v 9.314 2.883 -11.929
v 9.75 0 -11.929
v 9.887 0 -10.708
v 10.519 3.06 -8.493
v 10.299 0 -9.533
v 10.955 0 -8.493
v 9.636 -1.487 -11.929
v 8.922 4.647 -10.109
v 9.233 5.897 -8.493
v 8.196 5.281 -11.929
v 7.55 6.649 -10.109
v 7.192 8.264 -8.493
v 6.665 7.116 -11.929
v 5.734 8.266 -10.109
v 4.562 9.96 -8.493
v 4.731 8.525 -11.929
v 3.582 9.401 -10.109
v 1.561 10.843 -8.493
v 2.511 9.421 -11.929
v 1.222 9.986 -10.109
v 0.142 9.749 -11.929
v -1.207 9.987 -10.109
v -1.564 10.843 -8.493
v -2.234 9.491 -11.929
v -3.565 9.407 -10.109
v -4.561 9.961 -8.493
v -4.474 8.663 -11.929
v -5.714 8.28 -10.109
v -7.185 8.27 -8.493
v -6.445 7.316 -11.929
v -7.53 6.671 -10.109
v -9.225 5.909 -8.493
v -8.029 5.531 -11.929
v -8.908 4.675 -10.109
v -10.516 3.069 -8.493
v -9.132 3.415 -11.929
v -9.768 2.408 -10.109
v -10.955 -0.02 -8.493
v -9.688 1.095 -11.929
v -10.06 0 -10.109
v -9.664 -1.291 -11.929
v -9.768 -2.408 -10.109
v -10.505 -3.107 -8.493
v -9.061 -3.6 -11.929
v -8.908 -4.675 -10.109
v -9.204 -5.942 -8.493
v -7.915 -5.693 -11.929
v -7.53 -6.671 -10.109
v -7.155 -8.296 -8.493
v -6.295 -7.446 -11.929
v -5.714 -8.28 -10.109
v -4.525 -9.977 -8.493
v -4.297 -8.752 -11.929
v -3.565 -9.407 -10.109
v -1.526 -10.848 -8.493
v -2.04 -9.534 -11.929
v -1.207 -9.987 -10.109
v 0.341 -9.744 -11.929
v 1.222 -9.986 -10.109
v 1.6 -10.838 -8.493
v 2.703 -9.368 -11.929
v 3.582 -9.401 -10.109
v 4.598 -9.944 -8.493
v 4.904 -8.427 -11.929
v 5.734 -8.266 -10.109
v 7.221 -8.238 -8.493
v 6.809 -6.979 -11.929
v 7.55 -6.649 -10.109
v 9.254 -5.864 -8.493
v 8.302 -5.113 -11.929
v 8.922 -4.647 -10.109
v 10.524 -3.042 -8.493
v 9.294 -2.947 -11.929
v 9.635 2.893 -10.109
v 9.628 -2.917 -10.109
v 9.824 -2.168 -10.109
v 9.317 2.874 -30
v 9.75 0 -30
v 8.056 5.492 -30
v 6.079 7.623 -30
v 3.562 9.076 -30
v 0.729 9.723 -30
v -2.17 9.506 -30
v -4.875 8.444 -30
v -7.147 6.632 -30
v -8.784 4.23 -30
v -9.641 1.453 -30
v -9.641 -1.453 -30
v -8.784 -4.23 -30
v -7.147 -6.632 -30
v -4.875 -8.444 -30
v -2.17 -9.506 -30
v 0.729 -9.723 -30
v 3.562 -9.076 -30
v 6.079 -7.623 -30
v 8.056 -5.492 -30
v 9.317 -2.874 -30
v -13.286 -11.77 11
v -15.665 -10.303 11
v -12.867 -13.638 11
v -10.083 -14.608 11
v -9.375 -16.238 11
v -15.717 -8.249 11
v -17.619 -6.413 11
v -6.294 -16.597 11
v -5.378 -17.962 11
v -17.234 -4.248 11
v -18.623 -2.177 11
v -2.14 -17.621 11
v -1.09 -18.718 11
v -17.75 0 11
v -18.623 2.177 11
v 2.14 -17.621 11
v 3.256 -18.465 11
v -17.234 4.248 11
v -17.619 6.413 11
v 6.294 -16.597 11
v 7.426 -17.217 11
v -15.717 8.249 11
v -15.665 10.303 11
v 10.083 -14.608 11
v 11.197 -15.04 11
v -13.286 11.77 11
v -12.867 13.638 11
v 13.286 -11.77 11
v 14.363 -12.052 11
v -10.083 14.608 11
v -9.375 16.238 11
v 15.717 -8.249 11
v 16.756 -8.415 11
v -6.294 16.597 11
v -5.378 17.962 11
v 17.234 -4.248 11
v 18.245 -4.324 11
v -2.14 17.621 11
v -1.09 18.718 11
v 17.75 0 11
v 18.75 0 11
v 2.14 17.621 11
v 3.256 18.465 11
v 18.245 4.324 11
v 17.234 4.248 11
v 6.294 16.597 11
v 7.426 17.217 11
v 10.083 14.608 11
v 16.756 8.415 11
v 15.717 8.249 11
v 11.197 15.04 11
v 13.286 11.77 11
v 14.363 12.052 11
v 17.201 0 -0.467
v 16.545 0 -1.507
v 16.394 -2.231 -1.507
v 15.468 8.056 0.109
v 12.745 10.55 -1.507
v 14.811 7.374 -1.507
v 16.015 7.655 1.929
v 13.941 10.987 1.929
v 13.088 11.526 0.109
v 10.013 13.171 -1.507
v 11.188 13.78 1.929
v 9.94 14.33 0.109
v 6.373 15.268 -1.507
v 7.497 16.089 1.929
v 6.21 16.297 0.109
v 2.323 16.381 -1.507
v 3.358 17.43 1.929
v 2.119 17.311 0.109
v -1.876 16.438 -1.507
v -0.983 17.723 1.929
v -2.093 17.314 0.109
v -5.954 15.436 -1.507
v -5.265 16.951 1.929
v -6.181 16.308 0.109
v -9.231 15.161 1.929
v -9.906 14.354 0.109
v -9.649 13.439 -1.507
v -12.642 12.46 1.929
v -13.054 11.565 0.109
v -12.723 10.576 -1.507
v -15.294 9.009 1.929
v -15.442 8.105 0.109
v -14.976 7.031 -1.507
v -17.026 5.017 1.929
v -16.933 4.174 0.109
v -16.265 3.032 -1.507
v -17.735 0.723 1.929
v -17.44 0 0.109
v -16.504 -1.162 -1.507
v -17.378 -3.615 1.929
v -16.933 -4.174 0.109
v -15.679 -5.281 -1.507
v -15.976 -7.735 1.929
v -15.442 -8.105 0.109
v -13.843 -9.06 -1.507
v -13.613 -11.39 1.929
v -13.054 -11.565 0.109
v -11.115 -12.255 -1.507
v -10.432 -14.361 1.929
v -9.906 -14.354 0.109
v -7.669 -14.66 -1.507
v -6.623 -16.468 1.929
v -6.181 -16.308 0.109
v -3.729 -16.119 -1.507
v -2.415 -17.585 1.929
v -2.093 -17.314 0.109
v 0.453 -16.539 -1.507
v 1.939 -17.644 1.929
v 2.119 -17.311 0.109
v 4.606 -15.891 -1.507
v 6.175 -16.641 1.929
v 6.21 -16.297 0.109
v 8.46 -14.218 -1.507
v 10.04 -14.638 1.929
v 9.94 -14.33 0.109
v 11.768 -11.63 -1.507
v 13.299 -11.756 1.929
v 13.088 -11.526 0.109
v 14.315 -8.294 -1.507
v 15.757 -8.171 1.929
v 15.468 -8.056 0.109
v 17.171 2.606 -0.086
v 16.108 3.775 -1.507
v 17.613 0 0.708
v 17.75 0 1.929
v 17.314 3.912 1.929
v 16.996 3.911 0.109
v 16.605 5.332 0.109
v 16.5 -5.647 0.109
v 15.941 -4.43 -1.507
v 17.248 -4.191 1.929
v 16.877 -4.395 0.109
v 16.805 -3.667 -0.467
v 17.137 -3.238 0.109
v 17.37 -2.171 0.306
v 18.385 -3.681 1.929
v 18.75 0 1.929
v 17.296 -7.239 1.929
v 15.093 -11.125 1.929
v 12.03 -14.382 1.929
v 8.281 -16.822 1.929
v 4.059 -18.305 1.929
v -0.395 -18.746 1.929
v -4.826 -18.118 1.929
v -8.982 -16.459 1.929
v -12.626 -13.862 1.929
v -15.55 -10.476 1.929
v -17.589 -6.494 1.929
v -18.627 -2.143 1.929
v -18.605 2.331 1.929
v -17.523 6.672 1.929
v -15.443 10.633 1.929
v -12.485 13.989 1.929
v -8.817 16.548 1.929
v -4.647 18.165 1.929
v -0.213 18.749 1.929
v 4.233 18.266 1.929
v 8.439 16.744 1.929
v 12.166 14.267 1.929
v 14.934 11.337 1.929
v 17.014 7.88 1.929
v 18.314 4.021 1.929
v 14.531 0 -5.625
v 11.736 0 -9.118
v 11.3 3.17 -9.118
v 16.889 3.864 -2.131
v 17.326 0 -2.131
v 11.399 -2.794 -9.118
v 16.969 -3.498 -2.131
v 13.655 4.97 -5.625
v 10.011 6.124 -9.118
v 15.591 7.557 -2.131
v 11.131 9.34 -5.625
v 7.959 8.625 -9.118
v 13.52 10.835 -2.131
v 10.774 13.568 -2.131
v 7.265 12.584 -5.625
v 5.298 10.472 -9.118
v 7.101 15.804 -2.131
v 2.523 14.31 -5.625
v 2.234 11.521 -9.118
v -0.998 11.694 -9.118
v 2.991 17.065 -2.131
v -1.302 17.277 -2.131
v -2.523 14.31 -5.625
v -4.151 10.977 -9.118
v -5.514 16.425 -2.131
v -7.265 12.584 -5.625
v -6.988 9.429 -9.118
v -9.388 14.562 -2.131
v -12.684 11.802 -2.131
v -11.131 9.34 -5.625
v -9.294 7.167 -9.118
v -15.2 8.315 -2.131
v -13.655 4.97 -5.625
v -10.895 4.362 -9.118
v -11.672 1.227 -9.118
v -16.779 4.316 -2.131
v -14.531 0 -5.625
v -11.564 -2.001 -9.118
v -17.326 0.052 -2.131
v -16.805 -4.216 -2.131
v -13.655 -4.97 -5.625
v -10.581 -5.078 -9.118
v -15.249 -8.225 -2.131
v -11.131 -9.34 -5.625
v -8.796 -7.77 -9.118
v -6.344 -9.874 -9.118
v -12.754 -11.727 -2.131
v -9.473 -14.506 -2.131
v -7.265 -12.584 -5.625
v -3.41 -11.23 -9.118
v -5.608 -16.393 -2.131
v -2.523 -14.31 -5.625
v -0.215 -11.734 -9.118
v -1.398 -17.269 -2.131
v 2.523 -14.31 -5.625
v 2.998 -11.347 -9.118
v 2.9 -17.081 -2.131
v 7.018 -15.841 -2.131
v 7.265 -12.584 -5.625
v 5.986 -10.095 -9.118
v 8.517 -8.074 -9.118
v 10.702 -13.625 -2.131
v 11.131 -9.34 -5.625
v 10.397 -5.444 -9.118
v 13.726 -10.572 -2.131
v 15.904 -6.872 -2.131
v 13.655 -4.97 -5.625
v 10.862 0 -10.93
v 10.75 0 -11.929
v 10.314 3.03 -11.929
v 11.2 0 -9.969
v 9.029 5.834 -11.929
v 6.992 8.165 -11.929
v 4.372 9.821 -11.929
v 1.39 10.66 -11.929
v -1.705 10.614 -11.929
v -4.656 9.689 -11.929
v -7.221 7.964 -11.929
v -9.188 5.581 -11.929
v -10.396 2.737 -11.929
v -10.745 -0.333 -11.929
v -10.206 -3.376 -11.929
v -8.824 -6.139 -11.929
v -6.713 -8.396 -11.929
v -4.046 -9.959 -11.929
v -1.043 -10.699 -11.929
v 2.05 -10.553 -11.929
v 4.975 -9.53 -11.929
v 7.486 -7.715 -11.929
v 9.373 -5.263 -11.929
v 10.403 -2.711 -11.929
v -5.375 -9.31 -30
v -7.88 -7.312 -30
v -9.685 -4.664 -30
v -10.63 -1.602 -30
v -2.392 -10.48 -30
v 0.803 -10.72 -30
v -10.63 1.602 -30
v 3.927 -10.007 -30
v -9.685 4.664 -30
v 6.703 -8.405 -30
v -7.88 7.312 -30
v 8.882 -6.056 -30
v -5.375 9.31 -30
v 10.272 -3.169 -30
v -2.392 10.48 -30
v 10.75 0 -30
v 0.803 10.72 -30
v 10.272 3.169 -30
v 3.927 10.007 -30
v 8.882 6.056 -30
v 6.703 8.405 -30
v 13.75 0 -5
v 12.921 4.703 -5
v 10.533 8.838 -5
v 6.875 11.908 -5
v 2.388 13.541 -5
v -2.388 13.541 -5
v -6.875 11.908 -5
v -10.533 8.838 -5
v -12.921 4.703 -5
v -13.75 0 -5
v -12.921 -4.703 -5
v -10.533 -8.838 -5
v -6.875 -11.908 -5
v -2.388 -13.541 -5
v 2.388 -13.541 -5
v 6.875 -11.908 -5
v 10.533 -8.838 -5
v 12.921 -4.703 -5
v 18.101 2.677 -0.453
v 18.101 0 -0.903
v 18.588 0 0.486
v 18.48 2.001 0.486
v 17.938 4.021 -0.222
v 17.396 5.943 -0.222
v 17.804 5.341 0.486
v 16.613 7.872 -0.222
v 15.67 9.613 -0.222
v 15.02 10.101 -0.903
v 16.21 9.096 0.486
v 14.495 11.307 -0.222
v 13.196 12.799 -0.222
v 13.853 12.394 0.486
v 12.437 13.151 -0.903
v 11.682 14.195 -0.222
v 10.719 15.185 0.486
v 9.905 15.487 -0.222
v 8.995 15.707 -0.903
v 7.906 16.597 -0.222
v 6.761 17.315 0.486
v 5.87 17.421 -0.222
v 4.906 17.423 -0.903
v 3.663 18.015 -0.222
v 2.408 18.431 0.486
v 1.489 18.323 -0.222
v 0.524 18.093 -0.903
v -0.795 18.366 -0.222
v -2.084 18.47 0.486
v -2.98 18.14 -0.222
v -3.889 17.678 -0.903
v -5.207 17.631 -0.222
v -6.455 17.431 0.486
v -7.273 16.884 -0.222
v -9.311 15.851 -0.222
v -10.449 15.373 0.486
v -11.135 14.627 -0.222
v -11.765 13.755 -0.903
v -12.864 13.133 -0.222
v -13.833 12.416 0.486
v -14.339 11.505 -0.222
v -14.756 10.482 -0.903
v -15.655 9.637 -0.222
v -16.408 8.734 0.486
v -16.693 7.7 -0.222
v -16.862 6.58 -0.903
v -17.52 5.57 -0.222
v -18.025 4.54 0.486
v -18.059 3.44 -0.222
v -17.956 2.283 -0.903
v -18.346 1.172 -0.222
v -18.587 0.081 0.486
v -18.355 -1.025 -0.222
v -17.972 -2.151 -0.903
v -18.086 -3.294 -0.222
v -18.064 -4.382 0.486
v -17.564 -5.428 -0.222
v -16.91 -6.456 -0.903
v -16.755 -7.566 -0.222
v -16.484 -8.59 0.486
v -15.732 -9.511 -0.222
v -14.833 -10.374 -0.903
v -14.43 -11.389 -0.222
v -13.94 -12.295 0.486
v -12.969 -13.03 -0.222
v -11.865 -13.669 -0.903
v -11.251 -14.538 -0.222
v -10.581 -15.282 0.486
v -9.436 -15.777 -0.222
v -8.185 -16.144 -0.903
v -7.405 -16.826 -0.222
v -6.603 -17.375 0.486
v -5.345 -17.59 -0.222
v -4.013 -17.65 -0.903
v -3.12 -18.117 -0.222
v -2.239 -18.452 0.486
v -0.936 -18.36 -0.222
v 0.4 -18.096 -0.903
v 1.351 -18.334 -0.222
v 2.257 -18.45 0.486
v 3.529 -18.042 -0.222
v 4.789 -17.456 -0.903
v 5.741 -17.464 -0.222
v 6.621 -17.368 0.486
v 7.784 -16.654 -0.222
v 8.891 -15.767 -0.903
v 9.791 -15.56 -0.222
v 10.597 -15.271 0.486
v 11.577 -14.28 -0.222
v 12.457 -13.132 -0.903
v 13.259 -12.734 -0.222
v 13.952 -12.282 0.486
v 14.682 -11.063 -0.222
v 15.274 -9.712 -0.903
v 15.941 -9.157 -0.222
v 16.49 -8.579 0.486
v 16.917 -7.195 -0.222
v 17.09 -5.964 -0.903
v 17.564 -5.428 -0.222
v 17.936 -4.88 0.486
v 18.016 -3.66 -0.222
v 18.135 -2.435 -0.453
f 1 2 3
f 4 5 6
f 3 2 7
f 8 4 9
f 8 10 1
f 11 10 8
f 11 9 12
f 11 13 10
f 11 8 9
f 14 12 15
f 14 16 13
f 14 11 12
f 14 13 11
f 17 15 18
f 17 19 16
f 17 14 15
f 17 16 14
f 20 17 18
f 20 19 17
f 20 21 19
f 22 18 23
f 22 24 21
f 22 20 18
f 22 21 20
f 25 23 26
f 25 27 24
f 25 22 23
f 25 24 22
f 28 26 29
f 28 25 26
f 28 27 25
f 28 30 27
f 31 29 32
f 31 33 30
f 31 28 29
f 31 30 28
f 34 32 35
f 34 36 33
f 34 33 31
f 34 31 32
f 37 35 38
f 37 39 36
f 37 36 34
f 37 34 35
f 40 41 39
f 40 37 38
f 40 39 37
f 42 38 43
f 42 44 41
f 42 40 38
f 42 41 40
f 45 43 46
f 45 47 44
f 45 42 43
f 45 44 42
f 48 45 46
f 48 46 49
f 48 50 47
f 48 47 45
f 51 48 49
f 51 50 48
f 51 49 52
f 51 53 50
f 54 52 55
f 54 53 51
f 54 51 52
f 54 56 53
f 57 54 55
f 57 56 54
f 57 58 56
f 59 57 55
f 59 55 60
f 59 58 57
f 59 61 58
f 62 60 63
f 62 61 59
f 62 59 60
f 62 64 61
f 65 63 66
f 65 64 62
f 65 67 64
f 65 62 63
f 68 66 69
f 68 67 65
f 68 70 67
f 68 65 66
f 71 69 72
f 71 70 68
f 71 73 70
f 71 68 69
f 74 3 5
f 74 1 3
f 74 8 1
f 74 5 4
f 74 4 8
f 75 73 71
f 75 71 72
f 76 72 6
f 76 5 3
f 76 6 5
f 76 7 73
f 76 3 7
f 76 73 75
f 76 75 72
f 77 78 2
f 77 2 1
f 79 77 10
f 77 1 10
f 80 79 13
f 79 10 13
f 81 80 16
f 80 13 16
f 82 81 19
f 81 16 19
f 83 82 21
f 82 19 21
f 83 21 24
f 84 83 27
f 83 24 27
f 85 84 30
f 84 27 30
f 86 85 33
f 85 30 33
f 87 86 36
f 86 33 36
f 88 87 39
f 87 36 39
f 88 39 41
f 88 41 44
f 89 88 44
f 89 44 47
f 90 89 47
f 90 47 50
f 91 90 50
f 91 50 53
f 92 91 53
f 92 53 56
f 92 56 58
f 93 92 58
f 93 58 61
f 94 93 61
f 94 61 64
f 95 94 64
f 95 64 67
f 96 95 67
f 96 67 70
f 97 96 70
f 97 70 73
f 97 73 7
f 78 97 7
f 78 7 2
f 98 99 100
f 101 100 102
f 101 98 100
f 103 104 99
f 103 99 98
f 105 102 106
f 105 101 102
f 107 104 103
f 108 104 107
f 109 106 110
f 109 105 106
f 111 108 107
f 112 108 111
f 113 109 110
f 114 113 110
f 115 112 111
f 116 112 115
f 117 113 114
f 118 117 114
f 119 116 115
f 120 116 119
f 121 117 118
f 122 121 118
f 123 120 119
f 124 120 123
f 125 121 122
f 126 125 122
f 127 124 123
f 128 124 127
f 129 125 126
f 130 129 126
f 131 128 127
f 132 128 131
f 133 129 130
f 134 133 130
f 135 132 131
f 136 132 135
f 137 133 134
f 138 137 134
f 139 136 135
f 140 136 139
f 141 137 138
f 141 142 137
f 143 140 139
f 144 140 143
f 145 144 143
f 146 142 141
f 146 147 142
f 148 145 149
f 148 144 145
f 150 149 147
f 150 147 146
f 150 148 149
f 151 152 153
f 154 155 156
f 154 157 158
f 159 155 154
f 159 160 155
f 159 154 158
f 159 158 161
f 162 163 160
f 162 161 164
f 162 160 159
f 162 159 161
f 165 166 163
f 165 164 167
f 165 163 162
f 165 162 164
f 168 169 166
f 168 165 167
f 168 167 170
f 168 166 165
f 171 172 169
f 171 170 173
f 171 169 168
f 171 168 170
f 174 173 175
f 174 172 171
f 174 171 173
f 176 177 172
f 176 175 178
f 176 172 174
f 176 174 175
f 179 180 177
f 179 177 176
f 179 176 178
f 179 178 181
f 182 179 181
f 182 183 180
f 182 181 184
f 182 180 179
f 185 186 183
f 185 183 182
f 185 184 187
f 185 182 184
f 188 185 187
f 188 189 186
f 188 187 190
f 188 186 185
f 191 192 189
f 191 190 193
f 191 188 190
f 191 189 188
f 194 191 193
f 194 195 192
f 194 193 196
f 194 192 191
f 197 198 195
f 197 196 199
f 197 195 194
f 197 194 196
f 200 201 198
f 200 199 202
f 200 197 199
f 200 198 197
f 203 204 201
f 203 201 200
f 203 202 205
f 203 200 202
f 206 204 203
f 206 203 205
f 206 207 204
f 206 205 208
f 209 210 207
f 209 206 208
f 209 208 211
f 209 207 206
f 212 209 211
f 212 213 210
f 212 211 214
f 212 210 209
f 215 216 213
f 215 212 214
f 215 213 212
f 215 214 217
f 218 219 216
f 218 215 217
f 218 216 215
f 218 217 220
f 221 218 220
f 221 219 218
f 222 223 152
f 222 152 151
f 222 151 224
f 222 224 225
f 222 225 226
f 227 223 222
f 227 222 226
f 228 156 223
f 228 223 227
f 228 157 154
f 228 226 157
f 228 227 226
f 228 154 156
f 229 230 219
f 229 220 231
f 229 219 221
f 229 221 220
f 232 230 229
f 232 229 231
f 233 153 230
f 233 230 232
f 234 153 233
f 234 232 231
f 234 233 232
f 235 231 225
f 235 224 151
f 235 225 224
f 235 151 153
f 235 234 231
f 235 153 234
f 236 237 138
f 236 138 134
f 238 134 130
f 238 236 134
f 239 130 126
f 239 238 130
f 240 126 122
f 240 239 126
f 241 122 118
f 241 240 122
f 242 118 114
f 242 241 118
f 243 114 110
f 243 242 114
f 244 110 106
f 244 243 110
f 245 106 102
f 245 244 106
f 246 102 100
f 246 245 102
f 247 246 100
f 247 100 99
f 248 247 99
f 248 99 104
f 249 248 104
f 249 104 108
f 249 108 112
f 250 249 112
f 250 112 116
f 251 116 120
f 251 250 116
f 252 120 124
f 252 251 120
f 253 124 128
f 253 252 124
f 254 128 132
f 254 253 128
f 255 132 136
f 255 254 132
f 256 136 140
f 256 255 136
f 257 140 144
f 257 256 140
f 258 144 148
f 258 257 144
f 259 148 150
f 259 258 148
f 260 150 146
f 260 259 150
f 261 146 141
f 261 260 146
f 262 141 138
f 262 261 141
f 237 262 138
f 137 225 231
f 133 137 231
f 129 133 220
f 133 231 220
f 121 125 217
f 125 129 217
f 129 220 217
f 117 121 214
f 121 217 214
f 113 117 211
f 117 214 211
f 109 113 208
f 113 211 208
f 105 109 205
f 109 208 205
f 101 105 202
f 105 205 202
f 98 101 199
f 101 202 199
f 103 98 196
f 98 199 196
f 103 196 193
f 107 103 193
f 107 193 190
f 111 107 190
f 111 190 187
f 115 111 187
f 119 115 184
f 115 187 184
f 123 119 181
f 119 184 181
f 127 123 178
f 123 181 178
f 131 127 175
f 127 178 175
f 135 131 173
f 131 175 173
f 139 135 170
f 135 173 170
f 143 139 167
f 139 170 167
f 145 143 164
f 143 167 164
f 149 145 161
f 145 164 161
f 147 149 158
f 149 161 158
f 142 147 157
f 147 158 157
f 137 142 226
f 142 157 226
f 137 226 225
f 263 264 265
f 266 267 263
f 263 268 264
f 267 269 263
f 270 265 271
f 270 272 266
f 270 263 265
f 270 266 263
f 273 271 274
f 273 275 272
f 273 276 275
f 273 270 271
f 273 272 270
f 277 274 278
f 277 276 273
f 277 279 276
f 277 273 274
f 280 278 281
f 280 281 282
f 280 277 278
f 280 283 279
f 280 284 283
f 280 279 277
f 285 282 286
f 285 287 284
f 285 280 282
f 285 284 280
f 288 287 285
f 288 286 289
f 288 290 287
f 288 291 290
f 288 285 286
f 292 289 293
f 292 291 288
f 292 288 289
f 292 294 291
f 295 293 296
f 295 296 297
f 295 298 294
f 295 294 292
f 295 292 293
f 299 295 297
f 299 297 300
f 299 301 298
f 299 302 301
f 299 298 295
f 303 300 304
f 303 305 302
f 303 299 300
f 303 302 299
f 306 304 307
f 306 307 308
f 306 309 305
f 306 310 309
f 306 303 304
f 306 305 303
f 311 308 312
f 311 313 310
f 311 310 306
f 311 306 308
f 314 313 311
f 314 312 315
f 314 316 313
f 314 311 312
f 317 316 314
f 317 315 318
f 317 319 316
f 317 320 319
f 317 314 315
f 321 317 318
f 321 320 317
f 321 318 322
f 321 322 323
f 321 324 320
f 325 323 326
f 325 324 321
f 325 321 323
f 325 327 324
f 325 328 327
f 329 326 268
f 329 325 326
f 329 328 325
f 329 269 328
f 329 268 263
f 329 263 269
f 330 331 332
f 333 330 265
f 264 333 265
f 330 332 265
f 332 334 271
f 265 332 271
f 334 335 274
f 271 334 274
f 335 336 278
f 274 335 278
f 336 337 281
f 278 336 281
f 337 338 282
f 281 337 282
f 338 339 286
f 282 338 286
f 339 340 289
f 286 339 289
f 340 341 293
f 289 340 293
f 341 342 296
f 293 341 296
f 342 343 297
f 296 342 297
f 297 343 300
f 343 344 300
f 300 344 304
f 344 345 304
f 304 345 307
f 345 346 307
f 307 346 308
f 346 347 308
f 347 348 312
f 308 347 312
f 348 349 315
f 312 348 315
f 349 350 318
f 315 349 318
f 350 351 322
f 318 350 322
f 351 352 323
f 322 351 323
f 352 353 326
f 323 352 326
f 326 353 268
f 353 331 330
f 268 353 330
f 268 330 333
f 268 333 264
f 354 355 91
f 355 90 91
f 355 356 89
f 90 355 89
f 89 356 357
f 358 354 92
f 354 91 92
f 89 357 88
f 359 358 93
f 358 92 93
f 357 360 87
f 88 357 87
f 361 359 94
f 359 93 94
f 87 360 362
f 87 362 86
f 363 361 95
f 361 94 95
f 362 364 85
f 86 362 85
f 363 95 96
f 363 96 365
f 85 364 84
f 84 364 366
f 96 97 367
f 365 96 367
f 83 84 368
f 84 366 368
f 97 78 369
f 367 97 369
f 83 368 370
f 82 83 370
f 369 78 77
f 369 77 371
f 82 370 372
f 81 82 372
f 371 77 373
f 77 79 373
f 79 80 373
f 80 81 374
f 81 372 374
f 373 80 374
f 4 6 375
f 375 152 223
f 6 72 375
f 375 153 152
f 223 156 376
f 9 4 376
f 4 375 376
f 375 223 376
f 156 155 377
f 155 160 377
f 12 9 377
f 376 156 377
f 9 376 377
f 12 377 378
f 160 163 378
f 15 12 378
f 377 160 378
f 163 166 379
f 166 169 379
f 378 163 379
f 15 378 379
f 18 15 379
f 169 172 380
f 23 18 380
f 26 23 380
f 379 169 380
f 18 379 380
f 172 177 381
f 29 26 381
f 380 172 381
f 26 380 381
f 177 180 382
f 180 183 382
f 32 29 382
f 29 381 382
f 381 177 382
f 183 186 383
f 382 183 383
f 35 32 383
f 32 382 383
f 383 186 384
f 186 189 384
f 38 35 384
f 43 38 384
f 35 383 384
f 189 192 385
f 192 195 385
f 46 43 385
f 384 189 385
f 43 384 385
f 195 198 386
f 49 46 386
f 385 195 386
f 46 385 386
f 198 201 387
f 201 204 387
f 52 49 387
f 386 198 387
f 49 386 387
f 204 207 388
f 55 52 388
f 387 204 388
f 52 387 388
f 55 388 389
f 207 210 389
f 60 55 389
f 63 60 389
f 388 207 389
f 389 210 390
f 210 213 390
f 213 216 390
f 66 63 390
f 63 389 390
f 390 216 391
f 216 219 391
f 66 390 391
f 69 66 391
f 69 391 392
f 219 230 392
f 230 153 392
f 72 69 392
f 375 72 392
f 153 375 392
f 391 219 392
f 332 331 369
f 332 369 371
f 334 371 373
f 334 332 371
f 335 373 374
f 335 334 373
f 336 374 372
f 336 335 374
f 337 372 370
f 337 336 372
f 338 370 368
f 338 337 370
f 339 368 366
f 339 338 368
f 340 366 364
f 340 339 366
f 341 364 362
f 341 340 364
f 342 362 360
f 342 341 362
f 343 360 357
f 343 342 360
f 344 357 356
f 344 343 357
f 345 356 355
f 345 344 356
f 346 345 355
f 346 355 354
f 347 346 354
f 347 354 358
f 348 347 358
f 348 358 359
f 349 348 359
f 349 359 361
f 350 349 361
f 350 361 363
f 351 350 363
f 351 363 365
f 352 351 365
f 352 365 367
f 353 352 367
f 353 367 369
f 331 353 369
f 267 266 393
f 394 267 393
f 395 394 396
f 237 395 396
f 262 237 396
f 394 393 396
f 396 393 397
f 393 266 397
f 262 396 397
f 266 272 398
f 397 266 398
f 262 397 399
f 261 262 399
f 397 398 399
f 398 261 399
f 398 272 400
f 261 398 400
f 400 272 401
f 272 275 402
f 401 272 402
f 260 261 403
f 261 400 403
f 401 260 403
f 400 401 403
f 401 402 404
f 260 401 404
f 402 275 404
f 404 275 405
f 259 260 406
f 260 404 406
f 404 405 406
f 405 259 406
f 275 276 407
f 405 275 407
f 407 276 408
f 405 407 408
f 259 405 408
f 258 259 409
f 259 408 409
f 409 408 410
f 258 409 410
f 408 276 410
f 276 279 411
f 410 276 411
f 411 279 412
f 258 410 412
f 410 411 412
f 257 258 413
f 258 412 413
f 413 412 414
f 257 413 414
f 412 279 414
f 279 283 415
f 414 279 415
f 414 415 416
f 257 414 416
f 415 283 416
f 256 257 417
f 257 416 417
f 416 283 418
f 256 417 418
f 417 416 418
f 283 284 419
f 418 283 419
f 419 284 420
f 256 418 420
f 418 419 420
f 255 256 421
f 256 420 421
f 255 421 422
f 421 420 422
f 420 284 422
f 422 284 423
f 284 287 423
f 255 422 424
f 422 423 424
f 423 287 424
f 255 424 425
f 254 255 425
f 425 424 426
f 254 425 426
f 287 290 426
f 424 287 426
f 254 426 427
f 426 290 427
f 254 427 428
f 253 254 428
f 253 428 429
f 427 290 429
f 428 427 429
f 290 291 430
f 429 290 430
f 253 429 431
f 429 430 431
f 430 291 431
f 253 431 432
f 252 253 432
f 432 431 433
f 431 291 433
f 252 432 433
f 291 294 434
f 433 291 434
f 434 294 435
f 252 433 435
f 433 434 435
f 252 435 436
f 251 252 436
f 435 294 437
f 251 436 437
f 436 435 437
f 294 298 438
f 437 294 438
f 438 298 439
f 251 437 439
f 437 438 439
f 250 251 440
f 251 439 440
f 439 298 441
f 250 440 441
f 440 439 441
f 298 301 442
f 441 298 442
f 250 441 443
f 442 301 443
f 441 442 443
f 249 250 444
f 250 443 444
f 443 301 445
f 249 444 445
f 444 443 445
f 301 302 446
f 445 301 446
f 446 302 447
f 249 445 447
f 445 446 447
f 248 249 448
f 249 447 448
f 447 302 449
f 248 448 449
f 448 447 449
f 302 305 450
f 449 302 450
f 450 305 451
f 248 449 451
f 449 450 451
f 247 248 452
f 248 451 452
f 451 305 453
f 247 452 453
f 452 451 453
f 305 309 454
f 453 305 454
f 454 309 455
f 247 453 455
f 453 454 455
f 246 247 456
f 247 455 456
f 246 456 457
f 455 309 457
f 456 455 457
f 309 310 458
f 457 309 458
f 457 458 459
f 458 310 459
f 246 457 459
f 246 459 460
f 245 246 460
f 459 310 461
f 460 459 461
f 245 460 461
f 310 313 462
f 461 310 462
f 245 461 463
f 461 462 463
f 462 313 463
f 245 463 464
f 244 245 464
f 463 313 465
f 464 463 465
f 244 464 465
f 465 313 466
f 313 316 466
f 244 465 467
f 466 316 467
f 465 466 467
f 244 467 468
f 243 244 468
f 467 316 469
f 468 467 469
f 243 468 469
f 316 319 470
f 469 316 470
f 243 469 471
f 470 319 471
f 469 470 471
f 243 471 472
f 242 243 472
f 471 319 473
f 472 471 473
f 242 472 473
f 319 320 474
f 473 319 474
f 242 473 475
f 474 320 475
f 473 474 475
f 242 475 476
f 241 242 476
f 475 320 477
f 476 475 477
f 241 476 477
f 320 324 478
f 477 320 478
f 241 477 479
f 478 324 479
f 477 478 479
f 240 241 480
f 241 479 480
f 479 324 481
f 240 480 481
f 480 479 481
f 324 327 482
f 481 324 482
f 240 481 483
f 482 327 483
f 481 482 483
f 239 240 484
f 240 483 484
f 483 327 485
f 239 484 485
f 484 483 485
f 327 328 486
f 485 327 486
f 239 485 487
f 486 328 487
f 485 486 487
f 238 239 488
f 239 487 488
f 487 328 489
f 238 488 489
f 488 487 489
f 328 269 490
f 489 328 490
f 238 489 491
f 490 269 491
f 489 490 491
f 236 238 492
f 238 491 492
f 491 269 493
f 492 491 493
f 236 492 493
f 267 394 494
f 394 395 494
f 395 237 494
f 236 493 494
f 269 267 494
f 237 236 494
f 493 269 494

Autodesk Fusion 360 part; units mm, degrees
sketch "Sketch1" plane through (0, 0, 0) normal (0, 0, 1) x (1, 0, 0) in component "funnel"
  circle A0 centre (0, 0) radius 17.75
  dimension "d1" = 35.5
extrude "Extrude2" add sketch "Sketch1" along normal blind 11 in component "funnel"
ref_plane "WorkPlane1" through (0, 0, -10) normal (0, 0, 1) x (1, 0, 0) in component "funnel"
sketch "Sketch2" plane through (0, 0, -10) normal (0, 0, 1) x (1, 0, 0) in component "funnel"
  circle A0 centre (0, 0) radius 8.75
  circle A1 centre (0, 0) radius 9.75
  circle A2 centre (0, 0) radius 17.75
  dimension "d7" = 1
  dimension "d10" = 9
loft "Loft1" add profiles "Sketch1", "Sketch2" section 1 section 2 contours A0 | A1 in component "funnel"
extrude "Extrude3" add 1 faces at (1.6592, 0.958, -10) along direction (0, 0, -1) blind 20 in component "funnel"
fillet "Fillet1" radius 5.5 2 edges at (-9.0902, -3.5258, -10) (-16.5488, -6.4187, 0) in component "funnel"
shell "Shell1" thickness 1 outward yes removed faces 2 at (2.6955, 3.38, 11) at (1.6592, 0.958, -30) in component "funnel"
component "funnel" placed x (1, 0, 0) y (0, 1, 0) z (0, 0, 1) at (0, 0, 0)
